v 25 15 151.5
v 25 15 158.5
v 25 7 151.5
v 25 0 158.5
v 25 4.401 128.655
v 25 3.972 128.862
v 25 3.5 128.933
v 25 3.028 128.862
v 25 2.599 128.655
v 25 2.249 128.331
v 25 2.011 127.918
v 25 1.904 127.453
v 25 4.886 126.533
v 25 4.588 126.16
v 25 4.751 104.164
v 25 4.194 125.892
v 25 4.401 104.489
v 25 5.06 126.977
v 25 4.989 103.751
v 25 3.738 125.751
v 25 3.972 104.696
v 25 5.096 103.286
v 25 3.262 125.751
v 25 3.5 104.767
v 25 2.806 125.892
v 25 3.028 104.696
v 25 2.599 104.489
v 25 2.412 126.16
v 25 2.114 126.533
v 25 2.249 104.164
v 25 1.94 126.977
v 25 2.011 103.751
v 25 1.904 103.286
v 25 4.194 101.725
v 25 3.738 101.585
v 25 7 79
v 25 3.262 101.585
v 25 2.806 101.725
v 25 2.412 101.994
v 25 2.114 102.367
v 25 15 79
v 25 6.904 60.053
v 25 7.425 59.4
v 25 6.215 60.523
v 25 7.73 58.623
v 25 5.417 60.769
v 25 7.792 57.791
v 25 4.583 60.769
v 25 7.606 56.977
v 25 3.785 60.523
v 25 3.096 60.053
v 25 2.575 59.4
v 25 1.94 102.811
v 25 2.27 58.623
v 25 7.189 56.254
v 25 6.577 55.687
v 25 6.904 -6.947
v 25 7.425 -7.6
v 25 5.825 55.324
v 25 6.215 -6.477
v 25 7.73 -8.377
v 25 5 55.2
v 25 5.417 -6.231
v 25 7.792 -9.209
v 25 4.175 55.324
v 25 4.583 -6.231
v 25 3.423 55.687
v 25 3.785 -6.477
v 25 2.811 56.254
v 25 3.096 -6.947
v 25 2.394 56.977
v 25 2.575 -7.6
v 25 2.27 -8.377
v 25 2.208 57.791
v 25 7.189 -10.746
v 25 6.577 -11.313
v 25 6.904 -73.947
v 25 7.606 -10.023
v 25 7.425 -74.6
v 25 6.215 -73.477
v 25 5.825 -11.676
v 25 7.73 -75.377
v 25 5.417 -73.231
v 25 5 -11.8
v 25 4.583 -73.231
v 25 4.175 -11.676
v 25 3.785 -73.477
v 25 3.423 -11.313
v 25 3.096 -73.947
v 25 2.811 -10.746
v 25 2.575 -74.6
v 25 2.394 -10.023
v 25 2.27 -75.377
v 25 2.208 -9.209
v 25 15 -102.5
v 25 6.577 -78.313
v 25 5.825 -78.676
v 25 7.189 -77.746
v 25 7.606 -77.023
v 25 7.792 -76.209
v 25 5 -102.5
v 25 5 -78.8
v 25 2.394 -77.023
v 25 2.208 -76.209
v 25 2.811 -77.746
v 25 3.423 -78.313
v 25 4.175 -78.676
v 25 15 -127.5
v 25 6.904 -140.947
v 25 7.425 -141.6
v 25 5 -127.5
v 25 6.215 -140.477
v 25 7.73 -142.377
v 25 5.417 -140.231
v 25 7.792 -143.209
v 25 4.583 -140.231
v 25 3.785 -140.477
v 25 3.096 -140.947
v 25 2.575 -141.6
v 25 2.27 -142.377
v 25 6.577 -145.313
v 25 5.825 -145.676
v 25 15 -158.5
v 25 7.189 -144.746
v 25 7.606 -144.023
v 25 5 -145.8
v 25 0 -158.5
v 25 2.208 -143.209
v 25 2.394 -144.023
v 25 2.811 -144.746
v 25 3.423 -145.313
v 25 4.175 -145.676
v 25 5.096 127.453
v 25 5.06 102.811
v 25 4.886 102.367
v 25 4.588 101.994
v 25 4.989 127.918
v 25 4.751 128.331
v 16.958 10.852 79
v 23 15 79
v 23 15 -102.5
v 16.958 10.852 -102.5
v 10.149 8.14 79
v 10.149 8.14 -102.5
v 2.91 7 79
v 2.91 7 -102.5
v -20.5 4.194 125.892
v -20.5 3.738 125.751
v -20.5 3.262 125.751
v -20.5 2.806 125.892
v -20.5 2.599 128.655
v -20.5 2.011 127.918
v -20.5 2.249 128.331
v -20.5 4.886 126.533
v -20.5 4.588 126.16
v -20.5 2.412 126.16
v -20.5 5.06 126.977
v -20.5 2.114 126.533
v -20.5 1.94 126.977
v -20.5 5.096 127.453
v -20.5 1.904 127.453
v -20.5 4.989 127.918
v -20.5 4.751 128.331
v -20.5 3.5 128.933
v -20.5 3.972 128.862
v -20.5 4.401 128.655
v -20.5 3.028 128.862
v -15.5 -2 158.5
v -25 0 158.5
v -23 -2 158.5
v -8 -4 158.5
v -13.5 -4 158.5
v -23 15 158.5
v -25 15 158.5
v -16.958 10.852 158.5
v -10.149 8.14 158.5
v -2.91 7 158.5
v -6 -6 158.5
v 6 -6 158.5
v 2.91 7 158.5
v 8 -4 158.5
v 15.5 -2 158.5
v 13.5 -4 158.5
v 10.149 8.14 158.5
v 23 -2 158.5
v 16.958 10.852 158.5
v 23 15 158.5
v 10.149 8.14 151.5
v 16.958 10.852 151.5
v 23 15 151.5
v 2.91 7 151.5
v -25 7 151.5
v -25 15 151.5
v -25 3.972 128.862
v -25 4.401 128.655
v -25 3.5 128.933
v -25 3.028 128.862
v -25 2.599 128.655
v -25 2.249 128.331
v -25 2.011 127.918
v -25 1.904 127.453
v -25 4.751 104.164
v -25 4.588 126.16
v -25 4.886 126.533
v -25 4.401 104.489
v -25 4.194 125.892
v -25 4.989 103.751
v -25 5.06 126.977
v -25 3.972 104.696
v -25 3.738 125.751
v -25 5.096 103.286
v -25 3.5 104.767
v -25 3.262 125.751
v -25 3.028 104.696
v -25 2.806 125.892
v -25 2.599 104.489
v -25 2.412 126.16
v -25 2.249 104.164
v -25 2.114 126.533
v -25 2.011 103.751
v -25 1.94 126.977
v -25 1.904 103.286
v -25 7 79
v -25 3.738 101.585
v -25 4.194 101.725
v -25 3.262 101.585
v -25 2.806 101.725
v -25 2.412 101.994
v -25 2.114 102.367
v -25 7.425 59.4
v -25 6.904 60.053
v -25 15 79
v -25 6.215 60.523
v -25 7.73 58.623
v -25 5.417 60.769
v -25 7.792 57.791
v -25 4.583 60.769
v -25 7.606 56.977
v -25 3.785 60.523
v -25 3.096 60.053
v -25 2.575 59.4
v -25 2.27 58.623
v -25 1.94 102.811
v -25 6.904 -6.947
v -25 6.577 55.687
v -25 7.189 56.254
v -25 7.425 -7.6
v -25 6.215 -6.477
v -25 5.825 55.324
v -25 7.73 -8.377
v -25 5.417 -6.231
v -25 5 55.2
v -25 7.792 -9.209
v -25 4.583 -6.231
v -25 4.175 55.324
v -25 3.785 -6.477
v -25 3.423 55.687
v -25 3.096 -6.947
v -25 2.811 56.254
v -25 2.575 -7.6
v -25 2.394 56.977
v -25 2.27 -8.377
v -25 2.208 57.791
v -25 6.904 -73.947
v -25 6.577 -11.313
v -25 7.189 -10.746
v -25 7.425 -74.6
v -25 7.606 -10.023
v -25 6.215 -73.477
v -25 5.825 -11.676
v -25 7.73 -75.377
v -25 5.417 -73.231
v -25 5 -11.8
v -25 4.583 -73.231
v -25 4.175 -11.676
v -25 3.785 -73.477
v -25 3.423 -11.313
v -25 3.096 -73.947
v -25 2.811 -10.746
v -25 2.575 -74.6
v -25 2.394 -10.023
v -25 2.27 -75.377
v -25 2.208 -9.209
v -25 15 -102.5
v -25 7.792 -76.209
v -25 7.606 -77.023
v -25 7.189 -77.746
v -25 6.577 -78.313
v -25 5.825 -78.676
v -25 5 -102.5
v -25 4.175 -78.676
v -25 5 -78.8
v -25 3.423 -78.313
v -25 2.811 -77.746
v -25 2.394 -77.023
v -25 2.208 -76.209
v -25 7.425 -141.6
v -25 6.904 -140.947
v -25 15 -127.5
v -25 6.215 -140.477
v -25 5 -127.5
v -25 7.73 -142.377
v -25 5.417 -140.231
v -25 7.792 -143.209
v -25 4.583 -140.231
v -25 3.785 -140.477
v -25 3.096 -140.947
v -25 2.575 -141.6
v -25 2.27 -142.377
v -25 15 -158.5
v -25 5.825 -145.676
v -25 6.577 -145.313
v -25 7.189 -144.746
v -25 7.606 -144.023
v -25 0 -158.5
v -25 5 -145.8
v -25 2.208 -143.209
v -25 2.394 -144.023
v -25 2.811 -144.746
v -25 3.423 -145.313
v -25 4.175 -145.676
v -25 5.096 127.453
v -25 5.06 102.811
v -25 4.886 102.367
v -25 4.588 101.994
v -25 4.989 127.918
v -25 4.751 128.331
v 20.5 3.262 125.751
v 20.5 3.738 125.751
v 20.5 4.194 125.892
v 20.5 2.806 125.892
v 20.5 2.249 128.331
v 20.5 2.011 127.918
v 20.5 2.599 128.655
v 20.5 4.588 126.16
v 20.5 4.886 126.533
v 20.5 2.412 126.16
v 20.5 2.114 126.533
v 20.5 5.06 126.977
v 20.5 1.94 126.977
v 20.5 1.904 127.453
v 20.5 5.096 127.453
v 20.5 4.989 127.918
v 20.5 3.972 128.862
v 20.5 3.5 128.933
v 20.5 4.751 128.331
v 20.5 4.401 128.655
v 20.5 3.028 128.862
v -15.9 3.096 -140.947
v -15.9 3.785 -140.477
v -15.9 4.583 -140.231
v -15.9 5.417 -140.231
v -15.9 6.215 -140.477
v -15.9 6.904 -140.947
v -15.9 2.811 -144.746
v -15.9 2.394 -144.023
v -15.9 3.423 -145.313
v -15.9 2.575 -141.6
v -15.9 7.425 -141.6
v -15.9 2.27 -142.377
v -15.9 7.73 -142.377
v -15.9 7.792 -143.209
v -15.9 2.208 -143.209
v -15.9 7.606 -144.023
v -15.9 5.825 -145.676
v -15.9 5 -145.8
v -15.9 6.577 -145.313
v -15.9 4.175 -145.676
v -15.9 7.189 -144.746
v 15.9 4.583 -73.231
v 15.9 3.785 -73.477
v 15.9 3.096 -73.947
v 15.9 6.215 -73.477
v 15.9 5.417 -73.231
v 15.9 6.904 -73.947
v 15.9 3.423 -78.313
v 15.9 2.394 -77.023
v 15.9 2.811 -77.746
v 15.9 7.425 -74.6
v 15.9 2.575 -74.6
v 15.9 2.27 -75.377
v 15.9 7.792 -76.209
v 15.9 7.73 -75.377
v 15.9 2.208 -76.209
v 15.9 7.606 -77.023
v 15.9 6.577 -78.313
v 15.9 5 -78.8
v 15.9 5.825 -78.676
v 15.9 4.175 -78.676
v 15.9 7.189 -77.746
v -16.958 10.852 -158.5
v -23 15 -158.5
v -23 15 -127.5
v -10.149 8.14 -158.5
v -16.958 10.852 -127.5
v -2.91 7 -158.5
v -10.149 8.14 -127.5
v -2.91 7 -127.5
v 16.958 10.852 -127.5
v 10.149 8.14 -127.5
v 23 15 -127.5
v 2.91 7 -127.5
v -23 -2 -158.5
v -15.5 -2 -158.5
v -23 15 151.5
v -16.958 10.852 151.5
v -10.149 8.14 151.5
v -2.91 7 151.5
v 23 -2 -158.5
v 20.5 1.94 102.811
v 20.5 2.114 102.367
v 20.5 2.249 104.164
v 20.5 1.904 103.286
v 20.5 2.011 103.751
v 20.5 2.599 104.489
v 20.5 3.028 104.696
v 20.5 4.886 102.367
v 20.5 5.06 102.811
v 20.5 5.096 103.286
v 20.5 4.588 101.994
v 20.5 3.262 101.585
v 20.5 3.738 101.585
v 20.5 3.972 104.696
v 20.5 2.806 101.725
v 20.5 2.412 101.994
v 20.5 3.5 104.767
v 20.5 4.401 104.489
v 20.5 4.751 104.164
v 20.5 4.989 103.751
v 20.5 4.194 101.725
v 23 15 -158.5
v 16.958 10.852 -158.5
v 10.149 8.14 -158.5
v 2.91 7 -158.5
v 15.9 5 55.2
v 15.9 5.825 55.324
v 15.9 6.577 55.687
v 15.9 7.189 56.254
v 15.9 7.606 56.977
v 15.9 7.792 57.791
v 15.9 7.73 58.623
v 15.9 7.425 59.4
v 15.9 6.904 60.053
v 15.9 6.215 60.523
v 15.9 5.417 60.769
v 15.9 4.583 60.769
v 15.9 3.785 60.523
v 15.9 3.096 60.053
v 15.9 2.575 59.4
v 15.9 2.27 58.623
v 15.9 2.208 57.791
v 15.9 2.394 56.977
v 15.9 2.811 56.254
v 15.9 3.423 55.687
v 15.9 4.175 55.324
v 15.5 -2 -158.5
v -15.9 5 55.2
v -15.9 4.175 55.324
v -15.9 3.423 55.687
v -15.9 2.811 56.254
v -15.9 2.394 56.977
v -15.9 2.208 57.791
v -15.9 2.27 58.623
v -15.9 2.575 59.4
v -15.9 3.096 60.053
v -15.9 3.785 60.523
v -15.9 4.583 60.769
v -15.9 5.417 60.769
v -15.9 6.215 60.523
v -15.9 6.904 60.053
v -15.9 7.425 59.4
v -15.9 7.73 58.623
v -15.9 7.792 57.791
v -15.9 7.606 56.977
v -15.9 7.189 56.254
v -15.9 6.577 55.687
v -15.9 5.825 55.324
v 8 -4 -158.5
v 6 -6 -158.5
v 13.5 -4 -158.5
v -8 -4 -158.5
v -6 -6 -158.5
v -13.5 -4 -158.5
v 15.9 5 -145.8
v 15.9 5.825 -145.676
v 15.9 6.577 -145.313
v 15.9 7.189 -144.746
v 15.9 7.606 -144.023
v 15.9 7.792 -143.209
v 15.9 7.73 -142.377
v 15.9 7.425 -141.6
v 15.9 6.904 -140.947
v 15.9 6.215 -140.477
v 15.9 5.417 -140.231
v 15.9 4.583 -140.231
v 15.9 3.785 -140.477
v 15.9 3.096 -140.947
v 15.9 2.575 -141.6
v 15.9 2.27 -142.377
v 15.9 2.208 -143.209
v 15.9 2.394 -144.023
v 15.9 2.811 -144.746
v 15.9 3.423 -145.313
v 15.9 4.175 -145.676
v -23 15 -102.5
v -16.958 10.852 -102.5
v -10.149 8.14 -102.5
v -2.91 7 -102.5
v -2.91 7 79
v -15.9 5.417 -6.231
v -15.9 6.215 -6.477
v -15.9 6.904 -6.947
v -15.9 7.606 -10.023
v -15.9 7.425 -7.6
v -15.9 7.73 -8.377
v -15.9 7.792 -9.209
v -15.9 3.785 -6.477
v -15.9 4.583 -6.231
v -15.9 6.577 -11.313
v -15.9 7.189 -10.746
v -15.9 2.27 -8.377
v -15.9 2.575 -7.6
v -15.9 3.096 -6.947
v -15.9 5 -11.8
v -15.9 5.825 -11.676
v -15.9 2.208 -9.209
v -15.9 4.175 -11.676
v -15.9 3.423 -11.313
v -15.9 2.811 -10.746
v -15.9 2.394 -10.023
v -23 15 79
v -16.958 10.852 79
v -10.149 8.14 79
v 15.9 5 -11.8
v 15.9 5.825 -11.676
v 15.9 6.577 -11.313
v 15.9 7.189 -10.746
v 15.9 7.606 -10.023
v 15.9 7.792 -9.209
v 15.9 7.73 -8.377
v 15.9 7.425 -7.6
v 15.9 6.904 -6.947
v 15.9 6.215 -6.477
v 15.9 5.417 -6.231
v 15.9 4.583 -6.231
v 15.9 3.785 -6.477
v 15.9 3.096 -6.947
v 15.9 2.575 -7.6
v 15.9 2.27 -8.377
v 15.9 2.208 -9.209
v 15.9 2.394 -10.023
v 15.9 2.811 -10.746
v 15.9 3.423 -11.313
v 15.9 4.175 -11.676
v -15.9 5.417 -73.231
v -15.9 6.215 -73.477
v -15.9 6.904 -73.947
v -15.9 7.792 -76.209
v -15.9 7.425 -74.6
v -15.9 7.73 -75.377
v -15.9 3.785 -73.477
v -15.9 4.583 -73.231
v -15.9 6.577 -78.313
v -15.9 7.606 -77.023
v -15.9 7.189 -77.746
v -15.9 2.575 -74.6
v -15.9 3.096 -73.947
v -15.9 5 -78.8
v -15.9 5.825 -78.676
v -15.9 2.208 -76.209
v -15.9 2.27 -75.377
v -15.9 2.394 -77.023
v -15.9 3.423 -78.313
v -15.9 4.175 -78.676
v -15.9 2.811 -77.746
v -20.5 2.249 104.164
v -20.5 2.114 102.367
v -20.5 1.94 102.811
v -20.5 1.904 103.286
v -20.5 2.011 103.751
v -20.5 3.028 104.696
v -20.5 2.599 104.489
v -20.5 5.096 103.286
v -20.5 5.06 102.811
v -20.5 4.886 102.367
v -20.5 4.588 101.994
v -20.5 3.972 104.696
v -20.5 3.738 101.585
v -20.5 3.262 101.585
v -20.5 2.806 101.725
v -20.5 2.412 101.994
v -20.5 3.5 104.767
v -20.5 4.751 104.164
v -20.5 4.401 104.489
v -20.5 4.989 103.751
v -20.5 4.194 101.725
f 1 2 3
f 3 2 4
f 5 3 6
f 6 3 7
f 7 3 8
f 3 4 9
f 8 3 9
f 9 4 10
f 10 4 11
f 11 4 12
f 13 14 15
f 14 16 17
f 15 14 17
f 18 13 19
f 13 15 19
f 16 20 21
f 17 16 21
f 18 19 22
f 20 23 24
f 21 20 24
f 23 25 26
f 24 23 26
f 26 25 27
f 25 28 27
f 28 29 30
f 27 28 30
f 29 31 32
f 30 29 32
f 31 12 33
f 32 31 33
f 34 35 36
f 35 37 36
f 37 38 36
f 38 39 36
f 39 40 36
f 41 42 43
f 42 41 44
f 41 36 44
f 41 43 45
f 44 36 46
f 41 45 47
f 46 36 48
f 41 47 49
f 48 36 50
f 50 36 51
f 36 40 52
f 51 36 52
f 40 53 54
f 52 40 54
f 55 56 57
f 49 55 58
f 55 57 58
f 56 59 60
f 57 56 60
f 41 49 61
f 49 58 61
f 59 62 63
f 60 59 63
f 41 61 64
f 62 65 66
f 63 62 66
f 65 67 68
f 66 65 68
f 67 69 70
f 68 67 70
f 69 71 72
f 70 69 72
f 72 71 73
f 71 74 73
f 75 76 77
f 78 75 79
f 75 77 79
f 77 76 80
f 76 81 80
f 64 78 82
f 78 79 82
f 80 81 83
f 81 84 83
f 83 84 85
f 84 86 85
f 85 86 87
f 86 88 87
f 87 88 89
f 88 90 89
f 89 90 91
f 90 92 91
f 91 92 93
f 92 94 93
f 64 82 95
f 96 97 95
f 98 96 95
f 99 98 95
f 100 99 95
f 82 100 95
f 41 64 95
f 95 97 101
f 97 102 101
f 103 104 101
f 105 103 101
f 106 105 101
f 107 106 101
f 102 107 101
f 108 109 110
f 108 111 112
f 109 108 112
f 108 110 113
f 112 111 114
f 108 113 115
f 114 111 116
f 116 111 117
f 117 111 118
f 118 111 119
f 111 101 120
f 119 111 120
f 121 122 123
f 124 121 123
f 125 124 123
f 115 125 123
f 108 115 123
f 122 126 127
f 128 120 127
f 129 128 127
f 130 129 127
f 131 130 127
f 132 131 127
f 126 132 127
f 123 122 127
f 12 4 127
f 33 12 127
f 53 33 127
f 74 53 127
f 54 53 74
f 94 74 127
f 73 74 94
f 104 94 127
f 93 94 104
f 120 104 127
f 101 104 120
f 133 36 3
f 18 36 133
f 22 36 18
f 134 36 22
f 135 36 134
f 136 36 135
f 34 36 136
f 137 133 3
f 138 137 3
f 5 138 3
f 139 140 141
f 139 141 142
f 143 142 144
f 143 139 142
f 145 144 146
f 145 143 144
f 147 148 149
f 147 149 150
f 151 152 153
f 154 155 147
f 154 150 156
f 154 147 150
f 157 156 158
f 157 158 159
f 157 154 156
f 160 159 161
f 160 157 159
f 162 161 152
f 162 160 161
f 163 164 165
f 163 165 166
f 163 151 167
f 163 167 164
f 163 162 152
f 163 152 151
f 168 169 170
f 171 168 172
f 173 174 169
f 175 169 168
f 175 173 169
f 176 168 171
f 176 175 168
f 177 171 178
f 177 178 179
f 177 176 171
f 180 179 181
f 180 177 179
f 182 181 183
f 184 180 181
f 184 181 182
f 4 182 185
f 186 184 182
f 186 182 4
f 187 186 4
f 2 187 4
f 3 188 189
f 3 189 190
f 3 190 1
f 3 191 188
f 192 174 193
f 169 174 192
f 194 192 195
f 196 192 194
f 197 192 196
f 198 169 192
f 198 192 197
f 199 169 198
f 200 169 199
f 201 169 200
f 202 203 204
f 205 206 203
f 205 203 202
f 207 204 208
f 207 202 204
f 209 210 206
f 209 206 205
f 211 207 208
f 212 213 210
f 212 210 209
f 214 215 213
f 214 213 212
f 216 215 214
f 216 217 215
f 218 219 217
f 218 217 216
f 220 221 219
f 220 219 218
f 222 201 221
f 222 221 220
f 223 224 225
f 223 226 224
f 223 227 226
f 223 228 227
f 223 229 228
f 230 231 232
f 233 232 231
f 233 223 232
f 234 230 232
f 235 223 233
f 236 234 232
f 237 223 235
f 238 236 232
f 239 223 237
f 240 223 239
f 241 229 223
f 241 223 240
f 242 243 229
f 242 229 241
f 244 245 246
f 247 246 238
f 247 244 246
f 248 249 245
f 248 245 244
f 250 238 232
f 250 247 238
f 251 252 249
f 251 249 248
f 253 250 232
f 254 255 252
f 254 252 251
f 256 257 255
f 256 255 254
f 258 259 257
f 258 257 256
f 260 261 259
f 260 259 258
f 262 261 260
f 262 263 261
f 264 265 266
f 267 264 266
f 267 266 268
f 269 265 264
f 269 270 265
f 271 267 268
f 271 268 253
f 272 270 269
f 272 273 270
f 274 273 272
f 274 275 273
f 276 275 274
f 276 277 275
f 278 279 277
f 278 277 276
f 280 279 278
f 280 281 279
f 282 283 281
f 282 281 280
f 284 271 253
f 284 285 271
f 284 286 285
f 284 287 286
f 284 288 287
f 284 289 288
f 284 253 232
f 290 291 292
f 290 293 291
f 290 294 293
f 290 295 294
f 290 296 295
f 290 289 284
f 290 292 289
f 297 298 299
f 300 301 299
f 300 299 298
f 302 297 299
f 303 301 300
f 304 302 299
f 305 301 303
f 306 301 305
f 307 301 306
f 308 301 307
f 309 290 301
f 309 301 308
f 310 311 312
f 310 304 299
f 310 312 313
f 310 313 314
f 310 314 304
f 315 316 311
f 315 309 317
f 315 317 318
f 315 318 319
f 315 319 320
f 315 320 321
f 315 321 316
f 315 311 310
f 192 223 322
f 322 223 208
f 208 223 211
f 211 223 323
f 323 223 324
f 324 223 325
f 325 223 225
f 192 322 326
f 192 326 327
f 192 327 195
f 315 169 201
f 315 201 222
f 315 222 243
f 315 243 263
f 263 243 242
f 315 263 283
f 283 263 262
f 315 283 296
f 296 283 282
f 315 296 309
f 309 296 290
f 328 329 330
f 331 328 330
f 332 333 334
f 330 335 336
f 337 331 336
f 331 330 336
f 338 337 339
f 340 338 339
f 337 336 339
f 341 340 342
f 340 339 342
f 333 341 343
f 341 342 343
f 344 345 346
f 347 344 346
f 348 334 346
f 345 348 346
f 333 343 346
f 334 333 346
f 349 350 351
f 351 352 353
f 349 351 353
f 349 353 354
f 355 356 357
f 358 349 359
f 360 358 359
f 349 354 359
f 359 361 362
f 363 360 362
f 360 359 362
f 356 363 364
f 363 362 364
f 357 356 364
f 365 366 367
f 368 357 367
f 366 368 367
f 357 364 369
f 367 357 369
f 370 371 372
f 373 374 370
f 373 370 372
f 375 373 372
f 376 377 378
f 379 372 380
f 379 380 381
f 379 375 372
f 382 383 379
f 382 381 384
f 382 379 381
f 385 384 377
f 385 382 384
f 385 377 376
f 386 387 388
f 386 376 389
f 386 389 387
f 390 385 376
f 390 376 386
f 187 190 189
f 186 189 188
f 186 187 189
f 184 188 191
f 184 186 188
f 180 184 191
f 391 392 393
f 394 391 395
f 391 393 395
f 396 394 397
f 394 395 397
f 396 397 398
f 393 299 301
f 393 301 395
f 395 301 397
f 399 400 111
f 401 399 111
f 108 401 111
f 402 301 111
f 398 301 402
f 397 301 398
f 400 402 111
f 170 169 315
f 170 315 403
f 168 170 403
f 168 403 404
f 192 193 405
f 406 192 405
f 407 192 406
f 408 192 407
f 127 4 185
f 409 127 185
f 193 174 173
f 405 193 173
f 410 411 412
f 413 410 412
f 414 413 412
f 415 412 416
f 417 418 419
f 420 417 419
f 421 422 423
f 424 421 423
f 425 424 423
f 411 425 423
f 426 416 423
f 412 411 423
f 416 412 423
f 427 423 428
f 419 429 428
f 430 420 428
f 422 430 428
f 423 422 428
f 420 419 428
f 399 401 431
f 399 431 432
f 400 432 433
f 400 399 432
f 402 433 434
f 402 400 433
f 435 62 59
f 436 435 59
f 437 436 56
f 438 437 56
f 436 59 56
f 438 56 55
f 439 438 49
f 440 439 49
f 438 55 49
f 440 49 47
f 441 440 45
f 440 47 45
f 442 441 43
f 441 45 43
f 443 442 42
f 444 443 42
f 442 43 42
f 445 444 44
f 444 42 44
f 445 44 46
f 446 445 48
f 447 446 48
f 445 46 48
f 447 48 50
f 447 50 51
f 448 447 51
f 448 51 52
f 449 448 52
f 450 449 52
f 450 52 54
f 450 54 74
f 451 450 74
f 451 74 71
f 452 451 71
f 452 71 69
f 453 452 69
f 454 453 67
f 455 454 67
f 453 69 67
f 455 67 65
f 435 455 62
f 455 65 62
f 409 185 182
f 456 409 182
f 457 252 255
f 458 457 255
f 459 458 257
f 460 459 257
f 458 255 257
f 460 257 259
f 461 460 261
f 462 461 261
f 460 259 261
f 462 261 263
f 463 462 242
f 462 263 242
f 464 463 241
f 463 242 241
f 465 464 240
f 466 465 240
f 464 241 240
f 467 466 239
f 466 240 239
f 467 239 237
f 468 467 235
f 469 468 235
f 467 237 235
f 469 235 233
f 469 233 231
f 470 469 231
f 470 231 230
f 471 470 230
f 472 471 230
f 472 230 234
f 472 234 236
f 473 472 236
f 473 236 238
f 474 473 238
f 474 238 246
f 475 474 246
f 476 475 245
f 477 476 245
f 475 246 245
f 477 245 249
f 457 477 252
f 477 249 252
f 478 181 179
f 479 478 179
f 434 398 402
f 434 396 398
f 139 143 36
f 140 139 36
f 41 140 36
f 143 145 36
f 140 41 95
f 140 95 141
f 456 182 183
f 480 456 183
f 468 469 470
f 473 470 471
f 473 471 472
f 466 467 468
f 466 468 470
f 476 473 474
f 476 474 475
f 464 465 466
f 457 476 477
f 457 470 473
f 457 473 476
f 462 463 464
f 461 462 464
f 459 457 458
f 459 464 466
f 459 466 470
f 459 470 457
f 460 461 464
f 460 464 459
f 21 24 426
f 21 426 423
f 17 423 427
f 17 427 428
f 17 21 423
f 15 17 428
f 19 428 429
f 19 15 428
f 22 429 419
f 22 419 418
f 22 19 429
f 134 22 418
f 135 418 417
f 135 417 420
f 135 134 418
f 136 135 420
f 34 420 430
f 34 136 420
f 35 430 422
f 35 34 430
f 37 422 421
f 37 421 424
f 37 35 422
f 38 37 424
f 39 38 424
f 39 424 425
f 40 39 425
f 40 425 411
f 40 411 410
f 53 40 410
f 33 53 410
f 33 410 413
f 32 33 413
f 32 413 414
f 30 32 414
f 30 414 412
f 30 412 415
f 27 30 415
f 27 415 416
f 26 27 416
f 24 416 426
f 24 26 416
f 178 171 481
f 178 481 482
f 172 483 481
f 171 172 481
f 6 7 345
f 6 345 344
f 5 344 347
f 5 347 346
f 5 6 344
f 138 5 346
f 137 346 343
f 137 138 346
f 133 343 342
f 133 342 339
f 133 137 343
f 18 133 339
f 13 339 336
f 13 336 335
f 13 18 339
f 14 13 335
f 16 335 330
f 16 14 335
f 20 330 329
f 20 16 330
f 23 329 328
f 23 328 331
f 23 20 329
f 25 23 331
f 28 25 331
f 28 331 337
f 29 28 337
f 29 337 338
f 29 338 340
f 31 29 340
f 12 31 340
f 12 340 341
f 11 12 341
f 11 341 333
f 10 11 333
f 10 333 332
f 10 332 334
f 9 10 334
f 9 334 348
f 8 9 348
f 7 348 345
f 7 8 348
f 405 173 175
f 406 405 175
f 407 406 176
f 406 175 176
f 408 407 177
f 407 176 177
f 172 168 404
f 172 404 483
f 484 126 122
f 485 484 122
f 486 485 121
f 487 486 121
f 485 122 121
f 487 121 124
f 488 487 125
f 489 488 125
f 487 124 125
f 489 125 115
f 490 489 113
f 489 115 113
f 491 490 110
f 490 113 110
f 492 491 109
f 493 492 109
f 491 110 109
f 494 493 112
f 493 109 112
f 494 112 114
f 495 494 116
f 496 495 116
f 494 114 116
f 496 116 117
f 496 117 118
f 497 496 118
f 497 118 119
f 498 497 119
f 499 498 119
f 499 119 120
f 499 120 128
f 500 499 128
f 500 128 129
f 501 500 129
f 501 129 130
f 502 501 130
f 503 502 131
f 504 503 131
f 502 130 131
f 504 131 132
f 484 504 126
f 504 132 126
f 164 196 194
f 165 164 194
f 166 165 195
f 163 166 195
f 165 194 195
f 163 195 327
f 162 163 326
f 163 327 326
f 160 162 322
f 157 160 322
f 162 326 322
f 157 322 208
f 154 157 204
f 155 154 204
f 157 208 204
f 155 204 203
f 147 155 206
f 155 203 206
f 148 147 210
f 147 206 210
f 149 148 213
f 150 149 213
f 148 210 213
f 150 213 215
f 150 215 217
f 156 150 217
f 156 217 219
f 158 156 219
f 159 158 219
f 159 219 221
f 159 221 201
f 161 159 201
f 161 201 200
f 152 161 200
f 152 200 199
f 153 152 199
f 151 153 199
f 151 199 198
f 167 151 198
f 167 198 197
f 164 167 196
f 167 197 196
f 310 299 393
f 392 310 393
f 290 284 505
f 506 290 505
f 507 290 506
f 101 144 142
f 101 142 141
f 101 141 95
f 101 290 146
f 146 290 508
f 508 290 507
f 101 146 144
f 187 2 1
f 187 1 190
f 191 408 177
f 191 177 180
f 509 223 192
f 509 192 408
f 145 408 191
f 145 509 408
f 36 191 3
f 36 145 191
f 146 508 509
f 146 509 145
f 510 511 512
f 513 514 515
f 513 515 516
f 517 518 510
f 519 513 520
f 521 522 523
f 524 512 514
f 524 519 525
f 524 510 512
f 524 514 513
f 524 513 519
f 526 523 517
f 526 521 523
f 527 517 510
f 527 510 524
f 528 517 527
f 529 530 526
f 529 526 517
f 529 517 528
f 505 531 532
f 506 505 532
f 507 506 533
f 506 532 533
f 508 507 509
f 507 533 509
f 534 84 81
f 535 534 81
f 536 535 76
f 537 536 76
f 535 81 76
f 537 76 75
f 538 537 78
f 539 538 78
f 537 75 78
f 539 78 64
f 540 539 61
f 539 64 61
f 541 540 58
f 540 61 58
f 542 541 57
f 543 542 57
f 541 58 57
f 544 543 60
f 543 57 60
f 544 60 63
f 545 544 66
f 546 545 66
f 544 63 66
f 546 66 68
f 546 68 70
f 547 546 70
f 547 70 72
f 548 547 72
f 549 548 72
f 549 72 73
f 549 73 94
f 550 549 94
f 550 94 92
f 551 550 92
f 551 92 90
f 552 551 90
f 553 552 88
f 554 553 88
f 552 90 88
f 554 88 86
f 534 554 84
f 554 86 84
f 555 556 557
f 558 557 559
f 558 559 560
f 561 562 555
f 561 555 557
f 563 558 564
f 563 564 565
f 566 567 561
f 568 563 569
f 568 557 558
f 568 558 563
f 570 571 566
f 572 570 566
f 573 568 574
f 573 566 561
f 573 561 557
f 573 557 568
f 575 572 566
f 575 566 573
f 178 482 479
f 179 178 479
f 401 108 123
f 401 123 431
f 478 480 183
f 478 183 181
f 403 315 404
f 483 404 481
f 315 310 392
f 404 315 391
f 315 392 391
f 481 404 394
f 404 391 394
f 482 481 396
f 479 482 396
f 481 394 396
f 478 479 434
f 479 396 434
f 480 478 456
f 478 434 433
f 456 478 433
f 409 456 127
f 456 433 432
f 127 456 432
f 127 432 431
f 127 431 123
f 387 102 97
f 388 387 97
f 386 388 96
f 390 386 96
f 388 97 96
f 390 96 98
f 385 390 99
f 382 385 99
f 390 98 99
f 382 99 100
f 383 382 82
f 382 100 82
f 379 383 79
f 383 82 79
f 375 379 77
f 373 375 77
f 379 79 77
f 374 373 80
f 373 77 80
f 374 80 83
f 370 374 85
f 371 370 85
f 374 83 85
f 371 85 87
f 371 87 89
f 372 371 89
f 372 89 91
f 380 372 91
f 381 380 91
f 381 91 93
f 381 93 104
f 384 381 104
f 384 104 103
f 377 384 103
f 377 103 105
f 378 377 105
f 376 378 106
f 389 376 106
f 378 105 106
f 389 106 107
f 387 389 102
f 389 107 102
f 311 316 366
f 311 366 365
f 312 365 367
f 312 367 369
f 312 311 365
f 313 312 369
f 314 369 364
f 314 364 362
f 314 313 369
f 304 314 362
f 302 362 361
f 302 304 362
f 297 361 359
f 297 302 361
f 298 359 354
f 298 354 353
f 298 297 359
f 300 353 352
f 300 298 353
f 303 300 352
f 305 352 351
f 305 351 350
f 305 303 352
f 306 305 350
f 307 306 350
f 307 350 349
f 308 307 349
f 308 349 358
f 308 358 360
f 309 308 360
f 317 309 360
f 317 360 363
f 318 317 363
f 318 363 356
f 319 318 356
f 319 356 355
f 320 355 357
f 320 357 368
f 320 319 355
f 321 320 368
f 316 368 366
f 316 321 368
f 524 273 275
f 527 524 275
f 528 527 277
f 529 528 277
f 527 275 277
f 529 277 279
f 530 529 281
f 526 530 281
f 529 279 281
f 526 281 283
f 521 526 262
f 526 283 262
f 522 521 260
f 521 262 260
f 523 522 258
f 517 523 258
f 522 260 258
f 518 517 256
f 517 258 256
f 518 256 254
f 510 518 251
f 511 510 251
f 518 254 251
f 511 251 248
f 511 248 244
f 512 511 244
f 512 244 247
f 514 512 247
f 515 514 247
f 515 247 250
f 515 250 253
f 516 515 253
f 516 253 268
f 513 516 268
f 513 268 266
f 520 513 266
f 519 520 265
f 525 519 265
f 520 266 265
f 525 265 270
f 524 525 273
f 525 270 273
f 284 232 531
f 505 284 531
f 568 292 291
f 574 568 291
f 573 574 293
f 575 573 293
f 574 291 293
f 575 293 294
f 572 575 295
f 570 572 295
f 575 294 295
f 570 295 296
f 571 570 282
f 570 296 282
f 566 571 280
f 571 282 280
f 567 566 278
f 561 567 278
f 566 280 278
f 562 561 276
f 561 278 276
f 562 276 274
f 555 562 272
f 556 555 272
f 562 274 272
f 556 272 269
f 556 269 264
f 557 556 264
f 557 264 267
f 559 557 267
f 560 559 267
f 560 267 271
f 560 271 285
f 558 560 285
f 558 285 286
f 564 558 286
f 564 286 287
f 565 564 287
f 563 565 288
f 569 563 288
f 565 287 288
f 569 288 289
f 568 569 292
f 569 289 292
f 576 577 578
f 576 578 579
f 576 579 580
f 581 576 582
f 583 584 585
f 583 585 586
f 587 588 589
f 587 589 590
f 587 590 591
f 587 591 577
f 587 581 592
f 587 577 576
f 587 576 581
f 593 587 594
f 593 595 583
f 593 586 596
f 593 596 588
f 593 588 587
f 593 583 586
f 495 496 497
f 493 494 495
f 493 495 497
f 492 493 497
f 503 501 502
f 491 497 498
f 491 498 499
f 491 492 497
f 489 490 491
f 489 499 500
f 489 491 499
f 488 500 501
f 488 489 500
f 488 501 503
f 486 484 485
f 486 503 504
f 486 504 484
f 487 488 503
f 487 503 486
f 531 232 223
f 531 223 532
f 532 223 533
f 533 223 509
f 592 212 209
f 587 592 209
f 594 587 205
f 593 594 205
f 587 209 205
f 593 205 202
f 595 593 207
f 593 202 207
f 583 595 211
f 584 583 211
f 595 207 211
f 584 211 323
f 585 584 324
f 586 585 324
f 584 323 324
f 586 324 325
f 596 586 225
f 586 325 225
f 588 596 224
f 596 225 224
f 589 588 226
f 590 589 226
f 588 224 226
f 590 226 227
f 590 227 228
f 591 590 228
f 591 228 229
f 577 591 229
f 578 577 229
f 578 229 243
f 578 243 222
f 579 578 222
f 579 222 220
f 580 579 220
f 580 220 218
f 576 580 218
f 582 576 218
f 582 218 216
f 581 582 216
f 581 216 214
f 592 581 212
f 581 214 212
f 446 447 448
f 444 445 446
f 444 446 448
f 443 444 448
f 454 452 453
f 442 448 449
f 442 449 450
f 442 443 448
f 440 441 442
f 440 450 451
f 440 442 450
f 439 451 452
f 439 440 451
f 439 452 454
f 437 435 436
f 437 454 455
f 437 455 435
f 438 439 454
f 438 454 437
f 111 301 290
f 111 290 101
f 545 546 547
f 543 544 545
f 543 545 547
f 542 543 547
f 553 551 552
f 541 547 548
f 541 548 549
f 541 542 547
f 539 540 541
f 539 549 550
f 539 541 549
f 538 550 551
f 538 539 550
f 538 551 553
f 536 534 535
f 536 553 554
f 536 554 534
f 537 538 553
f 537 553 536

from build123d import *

# Parameters (mm, degrees)
SKETCH1_W               = 50
SKETCH1_H               = 317
BOSS_EXTRUDE1_DEPTH     = 7
BOSS_EXTRUDE2_DEPTH     = 317
SKETCH4_W               = 50
SKETCH4_H               = 72.5
CUT_EXTRUDE2_DEPTH      = 15
CUT_EXTRUDE3_DEPTH      = 12.5
CUT_EXTRUDE3_DEPTH_BACK = 2
SKETCH5_W               = 50
SKETCH5_H               = 25
SKETCH6_R               = 1.6
CUT_EXTRUDE4_DEPTH      = 4.5
SKETCH7_R               = 2.8
CUT_EXTRUDE5_DEPTH      = 9.1
LPATTERN2_COUNT         = 4
LPATTERN2_PITCH         = 67
MIRROR3_COPY_1_SKETCH_R = 2.8
MIRROR3_COPY_1_DEPTH    = 9.1
MIRROR3_COPY_2_SKETCH_R = 2.8
MIRROR3_COPY_2_DEPTH    = 9.1
MIRROR3_COPY_3_SKETCH_R = 2.8
MIRROR3_COPY_3_DEPTH    = 9.1
BOSS_EXTRUDE3_DEPTH     = 317


with BuildPart() as part:
    # Sketch1 → Boss-Extrude1 (new body)
    with BuildSketch(Plane(origin=(0, 0, 0), x_dir=(1, 0, 0), z_dir=(0, 1, 0))):
        Rectangle(SKETCH1_W, SKETCH1_H)
    extrude(amount=BOSS_EXTRUDE1_DEPTH)

    # Sketch2 → Boss-Extrude2 (add)
    with BuildSketch(Plane.XY.offset(158.5)):
        with BuildLine():
            Line((25, 0), (25, 15))
            Line((25, 15), (23, 15))
            ThreePointArc((23, 15), (12.243394569, 8.789970948), (-0.047456713, 7))
            Line((-0.047456713, 7), (-0.047456713, 0))
            Line((-0.047456713, 0), (25, 0))
        make_face()
    boss_extrude2 = extrude(amount=-BOSS_EXTRUDE2_DEPTH)

    # Mirror1: Boss-Extrude2 across plane
    add(boss_extrude2.mirror(Plane(origin=(0, 0, 0), x_dir=(0, 0, 1), z_dir=(1, 0, 0))))

    # Sketch4 → Cut-Extrude2 (cut)
    with BuildSketch(Plane(origin=(0, 7, 0), x_dir=(1, 0, 0), z_dir=(0, 1, 0))):
        with Locations((0, -115.25)):
            Rectangle(SKETCH4_W, SKETCH4_H)
    extrude(amount=CUT_EXTRUDE2_DEPTH, mode=Mode.SUBTRACT)

    # Sketch5 → Cut-Extrude3 (cut, two sides: drawn at the far end of the back side and taken through both)
    with BuildSketch(Plane(origin=(0, 7, 0), x_dir=(1, 0, 0), z_dir=(0, 1, 0)).offset(-CUT_EXTRUDE3_DEPTH_BACK)):
        with Locations((0, 115)):
            Rectangle(SKETCH5_W, SKETCH5_H)
    extrude(amount=CUT_EXTRUDE3_DEPTH + CUT_EXTRUDE3_DEPTH_BACK, mode=Mode.SUBTRACT)

    # Sketch6 → Cut-Extrude4 (cut)
    with BuildSketch(Plane.ZY.offset(25)):
        with Locations((103.166666667, 3.5)):
            Circle(SKETCH6_R)
        with Locations((127.333333333, 3.5)):
            Circle(SKETCH6_R)
    cut_extrude4 = extrude(amount=-CUT_EXTRUDE4_DEPTH, mode=Mode.SUBTRACT)

    # Sketch7 → Cut-Extrude5 (cut)
    with BuildSketch(Plane(origin=(25, 0, 0), x_dir=(0, 0, -1), z_dir=(1, 0, 0))):
        with Locations((143, 5)):
            Circle(SKETCH7_R)
    cut_extrude5 = extrude(amount=-CUT_EXTRUDE5_DEPTH, mode=Mode.SUBTRACT)

    # LPattern2: Cut-Extrude5 ×4
    with Locations(*[(0, 0, i * LPATTERN2_PITCH) for i in range(1, LPATTERN2_COUNT)]):
        add(cut_extrude5, mode=Mode.SUBTRACT)

    # Mirror3: Cut-Extrude4, Cut-Extrude5 across plane
    add(cut_extrude4.mirror(Plane(origin=(0, 0, 0), x_dir=(0, 0, 1), z_dir=(1, 0, 0))), mode=Mode.SUBTRACT)
    add(cut_extrude5.mirror(Plane(origin=(0, 0, 0), x_dir=(0, 0, 1), z_dir=(1, 0, 0))), mode=Mode.SUBTRACT)

    # Mirror3 copy 1 sketch → Mirror3 copy 1 (cut)
    with BuildSketch(Plane(origin=(-25, 0, 67), x_dir=(0, 0, -1), z_dir=(-1, 0, 0))):
        with Locations((143, -5)):
            Circle(MIRROR3_COPY_1_SKETCH_R)
    extrude(amount=-MIRROR3_COPY_1_DEPTH, mode=Mode.SUBTRACT)

    # Mirror3 copy 2 sketch → Mirror3 copy 2 (cut)
    with BuildSketch(Plane(origin=(-25, 0, 134), x_dir=(0, 0, -1), z_dir=(-1, 0, 0))):
        with Locations((143, -5)):
            Circle(MIRROR3_COPY_2_SKETCH_R)
    extrude(amount=-MIRROR3_COPY_2_DEPTH, mode=Mode.SUBTRACT)

    # Mirror3 copy 3 sketch → Mirror3 copy 3 (cut)
    with BuildSketch(Plane(origin=(-25, 0, 201), x_dir=(0, 0, -1), z_dir=(-1, 0, 0))):
        with Locations((143, -5)):
            Circle(MIRROR3_COPY_3_SKETCH_R)
    extrude(amount=-MIRROR3_COPY_3_DEPTH, mode=Mode.SUBTRACT)

    # Sketch8 → Boss-Extrude3 (add)
    with BuildSketch(Plane.XY.offset(158.5)):
        Polygon((23, -2), (15.5, -2), (13.5, -4), (8, -4), (6, -6), (0, -6), (0, 0), (25, 0), align=None)
    boss_extrude3 = extrude(amount=-BOSS_EXTRUDE3_DEPTH)

    # Mirror4: Boss-Extrude3 across plane
    add(boss_extrude3.mirror(Plane(origin=(0, 0, 0), x_dir=(0, 0, 1), z_dir=(1, 0, 0))))


solid = part.part
